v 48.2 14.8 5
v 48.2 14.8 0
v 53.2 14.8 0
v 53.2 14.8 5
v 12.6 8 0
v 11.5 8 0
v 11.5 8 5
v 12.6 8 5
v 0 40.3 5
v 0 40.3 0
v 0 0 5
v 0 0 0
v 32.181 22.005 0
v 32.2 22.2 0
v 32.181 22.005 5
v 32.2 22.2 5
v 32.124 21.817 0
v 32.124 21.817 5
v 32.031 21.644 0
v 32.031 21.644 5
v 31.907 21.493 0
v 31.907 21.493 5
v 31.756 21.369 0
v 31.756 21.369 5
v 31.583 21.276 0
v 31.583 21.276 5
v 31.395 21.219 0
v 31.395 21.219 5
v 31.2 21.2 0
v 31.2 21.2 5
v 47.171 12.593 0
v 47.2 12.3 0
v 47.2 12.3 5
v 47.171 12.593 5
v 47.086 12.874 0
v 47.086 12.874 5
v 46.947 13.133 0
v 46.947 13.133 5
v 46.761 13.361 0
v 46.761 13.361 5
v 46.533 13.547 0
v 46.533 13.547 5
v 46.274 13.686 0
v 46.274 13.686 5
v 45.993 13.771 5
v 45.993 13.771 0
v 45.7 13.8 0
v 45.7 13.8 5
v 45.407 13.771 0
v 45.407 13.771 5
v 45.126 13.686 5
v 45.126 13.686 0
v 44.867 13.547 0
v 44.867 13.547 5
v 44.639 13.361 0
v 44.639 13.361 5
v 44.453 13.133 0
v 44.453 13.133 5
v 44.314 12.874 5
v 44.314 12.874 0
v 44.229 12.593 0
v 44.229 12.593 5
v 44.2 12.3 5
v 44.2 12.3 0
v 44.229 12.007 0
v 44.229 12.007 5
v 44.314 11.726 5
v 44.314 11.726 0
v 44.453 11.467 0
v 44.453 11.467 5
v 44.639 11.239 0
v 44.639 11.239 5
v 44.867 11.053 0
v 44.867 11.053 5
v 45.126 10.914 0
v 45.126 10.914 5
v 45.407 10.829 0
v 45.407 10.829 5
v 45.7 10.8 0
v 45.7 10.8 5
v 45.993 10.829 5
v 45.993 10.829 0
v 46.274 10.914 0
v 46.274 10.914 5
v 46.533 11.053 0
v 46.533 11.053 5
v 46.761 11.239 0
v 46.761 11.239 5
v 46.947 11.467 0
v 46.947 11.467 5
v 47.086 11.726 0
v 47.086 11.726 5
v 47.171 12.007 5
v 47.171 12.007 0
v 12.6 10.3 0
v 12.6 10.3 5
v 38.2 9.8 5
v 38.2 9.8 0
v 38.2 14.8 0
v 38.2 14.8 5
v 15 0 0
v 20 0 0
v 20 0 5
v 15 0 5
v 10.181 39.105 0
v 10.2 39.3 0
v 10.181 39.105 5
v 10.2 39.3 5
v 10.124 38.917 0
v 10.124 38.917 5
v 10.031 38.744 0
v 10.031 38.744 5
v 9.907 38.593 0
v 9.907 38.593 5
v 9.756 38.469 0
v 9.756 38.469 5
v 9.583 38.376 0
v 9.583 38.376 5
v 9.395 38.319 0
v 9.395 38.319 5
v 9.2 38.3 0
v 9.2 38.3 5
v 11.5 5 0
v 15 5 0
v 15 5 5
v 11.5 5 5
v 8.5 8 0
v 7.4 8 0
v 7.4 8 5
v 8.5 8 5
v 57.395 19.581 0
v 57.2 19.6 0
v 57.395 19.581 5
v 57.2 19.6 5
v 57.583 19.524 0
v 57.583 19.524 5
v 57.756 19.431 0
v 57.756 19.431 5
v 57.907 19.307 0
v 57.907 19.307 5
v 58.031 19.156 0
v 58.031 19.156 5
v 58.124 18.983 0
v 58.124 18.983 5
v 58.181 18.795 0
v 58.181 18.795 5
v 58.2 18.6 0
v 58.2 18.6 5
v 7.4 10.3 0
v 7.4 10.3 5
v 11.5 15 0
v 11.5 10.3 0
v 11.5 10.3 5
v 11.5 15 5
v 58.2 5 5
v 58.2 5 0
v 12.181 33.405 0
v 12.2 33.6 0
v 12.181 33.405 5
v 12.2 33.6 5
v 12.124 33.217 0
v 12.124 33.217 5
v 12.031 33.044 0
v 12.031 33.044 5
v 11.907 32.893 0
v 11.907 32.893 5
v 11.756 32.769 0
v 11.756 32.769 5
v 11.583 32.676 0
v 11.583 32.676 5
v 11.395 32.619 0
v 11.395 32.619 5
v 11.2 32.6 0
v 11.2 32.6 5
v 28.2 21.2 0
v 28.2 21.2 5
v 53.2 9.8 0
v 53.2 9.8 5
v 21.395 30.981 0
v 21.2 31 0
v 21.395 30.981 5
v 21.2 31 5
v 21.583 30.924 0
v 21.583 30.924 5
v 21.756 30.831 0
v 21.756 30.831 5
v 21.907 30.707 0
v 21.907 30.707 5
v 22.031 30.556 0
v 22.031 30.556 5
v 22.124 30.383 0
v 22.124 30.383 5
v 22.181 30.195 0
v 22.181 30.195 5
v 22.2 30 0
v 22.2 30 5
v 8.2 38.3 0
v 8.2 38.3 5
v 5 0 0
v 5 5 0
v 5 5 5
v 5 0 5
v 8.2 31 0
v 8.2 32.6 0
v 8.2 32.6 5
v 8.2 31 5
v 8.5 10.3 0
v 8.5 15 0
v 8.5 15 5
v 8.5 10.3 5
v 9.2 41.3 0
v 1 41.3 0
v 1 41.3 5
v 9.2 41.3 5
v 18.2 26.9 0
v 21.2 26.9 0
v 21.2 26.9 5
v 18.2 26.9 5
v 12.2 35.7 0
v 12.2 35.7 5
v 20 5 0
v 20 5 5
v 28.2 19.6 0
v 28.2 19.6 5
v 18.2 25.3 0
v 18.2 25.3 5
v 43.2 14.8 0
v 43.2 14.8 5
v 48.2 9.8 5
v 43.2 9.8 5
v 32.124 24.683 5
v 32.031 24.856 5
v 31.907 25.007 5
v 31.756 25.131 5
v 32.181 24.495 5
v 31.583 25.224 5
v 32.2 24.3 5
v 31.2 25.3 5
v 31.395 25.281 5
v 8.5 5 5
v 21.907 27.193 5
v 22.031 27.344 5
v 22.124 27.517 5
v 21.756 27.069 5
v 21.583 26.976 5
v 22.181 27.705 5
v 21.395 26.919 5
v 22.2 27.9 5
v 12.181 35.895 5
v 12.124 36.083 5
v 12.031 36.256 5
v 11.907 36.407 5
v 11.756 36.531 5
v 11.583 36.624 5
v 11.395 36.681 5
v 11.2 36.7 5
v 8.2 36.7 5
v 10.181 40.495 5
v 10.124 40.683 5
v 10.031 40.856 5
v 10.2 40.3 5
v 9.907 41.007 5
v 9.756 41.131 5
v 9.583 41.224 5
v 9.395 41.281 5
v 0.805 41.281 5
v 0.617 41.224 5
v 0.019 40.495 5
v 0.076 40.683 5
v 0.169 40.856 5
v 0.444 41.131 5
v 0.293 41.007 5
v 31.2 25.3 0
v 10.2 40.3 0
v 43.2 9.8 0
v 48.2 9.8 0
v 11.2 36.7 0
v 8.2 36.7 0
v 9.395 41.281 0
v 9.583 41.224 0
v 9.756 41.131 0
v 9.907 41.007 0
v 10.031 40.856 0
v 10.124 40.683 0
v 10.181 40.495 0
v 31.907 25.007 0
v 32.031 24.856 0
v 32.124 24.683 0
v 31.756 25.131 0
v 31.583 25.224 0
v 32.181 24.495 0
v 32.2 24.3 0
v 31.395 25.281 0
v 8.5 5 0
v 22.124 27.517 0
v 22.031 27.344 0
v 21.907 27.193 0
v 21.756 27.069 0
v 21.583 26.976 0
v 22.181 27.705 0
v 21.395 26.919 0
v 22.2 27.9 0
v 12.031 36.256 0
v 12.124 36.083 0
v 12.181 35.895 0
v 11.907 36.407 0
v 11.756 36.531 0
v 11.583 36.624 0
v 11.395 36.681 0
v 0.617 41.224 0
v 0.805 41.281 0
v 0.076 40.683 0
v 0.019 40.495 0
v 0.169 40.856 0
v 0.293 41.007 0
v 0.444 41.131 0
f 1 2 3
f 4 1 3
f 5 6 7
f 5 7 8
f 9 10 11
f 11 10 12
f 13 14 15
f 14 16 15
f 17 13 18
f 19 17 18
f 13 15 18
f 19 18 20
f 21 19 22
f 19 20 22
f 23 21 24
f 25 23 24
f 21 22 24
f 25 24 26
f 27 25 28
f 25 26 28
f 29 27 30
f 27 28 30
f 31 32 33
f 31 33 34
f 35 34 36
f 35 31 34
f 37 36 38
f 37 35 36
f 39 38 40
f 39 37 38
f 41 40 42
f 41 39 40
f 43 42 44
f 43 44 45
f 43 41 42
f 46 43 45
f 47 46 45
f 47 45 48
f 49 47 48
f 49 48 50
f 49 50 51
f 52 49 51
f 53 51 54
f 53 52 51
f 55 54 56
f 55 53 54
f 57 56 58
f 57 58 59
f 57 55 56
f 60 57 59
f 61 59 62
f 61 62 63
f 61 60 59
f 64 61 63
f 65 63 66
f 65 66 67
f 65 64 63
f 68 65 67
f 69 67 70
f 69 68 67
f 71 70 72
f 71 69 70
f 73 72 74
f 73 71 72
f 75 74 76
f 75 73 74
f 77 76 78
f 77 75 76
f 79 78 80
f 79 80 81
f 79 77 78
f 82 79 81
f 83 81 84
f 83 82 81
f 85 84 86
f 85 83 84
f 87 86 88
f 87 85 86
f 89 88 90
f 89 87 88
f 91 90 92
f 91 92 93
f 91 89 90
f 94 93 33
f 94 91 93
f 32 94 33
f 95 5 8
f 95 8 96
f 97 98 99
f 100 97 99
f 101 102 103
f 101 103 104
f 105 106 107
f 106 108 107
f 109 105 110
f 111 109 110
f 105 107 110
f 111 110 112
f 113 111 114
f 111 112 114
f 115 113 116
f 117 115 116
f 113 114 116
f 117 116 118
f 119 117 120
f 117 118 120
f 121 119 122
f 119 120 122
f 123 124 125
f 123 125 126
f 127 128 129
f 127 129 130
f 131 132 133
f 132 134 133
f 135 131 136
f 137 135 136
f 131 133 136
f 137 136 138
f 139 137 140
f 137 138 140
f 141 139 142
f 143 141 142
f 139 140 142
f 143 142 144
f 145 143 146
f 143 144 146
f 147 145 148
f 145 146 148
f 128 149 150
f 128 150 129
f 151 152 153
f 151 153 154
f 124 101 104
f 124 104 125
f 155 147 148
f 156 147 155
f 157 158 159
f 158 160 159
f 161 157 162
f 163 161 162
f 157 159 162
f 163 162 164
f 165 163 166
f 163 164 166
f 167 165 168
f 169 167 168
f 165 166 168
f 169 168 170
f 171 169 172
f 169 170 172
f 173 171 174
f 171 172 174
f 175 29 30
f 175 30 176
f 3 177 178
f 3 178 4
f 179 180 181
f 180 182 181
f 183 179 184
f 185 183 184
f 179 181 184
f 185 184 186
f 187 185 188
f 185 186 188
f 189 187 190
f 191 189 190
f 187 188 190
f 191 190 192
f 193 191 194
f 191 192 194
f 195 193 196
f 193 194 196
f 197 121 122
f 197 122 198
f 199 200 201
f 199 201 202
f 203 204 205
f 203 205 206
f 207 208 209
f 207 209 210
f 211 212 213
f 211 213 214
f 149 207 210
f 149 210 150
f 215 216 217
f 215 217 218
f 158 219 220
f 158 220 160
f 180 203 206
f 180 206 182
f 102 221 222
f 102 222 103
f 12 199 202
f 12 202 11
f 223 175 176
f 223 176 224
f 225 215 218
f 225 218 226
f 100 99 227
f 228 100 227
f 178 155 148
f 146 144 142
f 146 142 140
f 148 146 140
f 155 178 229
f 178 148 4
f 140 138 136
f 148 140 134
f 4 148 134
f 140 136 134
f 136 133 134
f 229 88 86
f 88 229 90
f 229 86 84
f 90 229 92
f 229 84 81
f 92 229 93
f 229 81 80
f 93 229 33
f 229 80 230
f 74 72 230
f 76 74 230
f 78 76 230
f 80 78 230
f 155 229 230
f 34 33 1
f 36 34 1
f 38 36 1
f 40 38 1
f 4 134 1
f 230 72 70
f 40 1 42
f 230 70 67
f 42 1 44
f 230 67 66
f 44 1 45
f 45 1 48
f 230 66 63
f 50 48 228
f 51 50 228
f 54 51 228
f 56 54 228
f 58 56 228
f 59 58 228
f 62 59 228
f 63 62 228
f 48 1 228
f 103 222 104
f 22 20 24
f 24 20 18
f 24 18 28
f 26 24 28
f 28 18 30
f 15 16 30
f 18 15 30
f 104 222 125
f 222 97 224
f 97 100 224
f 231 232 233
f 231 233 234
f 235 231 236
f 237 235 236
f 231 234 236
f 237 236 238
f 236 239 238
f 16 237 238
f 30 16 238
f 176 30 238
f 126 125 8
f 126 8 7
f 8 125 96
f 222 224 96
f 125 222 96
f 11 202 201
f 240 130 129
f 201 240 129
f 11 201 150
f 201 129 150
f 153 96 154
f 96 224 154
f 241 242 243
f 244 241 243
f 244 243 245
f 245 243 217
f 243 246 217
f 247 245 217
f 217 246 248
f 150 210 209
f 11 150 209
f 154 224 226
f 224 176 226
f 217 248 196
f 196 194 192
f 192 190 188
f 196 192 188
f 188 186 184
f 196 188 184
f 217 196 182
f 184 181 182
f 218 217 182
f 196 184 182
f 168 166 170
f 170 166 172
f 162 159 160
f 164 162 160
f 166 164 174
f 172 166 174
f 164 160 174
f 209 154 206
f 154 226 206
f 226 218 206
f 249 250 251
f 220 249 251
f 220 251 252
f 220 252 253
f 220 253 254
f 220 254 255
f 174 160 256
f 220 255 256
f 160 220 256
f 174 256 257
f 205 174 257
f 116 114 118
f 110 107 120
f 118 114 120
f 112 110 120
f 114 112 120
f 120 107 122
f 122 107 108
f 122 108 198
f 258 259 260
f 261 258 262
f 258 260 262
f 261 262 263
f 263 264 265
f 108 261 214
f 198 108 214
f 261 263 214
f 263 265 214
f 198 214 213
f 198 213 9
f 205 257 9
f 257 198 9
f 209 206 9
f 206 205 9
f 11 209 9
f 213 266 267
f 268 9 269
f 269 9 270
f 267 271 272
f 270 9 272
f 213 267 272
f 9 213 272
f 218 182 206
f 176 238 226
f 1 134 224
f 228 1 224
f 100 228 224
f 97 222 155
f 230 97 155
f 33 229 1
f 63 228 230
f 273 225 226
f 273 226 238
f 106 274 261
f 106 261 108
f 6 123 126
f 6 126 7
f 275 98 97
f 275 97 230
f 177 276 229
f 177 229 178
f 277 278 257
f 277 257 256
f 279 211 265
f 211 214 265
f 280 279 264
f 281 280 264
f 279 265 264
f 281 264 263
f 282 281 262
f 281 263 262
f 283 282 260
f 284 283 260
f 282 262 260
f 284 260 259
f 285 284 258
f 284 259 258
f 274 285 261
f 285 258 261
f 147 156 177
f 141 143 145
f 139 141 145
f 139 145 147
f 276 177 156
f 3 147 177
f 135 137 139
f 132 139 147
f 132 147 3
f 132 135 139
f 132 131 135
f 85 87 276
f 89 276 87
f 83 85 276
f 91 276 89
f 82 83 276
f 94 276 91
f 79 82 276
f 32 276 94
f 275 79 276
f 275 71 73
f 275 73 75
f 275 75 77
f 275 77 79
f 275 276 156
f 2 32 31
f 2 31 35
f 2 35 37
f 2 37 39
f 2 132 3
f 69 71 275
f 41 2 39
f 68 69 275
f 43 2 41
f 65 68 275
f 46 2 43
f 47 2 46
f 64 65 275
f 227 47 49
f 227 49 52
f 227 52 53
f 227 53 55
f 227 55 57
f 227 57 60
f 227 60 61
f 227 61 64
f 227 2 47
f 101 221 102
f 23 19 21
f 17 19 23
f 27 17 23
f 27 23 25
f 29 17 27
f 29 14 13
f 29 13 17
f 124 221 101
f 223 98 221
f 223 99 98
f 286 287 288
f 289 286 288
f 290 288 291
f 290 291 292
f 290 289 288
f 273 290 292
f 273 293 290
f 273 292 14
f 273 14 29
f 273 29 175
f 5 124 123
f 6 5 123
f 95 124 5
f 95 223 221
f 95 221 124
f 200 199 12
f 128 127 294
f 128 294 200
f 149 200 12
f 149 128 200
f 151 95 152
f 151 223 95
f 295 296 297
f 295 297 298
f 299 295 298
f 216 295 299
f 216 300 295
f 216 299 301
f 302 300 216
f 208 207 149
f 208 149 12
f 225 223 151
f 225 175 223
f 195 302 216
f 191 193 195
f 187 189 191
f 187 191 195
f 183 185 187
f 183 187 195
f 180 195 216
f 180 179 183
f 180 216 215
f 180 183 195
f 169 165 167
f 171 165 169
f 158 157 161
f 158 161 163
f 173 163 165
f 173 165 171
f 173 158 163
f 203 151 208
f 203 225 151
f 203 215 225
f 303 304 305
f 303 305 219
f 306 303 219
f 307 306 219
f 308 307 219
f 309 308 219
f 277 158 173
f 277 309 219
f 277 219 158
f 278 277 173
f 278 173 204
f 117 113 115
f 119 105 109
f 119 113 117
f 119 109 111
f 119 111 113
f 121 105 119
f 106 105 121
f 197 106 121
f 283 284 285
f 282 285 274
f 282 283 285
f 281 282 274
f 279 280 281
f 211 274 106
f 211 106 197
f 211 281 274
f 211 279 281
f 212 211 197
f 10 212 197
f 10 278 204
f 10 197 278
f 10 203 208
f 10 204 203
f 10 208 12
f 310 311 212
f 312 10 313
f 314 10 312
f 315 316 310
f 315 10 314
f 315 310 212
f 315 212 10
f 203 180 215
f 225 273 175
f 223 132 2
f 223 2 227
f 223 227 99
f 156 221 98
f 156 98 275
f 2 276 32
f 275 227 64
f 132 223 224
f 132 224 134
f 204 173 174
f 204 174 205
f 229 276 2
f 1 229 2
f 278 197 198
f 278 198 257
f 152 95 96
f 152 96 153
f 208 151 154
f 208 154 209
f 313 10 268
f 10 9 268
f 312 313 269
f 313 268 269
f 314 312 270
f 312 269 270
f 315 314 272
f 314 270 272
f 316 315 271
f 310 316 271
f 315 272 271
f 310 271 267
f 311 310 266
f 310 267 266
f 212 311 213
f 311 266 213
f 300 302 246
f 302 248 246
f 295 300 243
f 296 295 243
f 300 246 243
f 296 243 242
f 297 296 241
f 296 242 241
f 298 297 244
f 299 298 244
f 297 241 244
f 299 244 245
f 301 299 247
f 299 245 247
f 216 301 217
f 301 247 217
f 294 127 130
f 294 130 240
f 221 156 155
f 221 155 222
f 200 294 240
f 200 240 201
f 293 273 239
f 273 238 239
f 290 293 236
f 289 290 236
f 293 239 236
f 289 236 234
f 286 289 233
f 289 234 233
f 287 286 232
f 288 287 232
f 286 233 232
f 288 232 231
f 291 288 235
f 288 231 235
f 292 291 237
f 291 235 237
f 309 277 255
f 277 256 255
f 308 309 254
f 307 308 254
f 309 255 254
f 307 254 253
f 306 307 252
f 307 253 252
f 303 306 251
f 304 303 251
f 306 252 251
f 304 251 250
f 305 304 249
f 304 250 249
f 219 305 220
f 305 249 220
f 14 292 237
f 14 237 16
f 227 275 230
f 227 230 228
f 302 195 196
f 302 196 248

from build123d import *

# Parameters (mm, degrees)
SKETCH1_R           = 1.5
SKETCH1_W           = 5
SKETCH1_H           = 5
BOSS_EXTRUDE1_DEPTH = 5
FILLET3_R           = 1


with BuildPart() as part:
    # Sketch1 → Boss-Extrude1 (new body)
    with BuildSketch(Plane.XY):
        Polygon((0, 5), (0, 19.982808697), (0, 25.3), (0, 30.1), (0, 41.3), (10.2, 41.3), (10.2, 38.3), (8.2, 38.3), (8.2, 36.7), (12.2, 36.7), (12.2, 32.6), (8.2, 32.6), (8.2, 31), (22.2, 31), (22.2, 26.9), (18.2, 26.9), (18.2, 25.3), (32.2, 25.3), (32.2, 21.2), (28.2, 21.2), (28.2, 19.6), (58.2, 19.6), (58.2, 5), (20, 5), (20, 0), (15, 0), (15, 5), (11.5, 5), (11.5, 8), (12.6, 8), (12.6, 10.3), (11.5, 10.3), (11.5, 15), (8.5, 15), (8.5, 10.3), (7.4, 10.3), (7.4, 8), (8.5, 8), (8.5, 5), (5, 5), (5, 0), (0, 0), align=None)
        with Locations((45.7, 12.3)):
            Circle(SKETCH1_R, mode=Mode.SUBTRACT)
        with Locations((40.7, 12.3)):
            Rectangle(SKETCH1_W, SKETCH1_H, mode=Mode.SUBTRACT)
        with Locations((50.7, 12.3)):
            Rectangle(SKETCH1_W, SKETCH1_H, mode=Mode.SUBTRACT)
    extrude(amount=BOSS_EXTRUDE1_DEPTH)

    # Fillet3
    fillet3_edges = [part.edges().sort_by_distance(p)[0] for p in [
        (0, 41.3, 2.5),
        (10.2, 41.3, 2.5),
        (10.2, 38.3, 2.5),
        (12.2, 36.7, 2.5),
        (12.2, 32.6, 2.5),
        (22.2, 31, 2.5),
        (22.2, 26.9, 2.5),
        (32.2, 25.3, 2.5),
        (32.2, 21.2, 2.5),
        (58.2, 19.6, 2.5),
    ]]
    fillet(fillet3_edges, radius=FILLET3_R)


solid = part.part
